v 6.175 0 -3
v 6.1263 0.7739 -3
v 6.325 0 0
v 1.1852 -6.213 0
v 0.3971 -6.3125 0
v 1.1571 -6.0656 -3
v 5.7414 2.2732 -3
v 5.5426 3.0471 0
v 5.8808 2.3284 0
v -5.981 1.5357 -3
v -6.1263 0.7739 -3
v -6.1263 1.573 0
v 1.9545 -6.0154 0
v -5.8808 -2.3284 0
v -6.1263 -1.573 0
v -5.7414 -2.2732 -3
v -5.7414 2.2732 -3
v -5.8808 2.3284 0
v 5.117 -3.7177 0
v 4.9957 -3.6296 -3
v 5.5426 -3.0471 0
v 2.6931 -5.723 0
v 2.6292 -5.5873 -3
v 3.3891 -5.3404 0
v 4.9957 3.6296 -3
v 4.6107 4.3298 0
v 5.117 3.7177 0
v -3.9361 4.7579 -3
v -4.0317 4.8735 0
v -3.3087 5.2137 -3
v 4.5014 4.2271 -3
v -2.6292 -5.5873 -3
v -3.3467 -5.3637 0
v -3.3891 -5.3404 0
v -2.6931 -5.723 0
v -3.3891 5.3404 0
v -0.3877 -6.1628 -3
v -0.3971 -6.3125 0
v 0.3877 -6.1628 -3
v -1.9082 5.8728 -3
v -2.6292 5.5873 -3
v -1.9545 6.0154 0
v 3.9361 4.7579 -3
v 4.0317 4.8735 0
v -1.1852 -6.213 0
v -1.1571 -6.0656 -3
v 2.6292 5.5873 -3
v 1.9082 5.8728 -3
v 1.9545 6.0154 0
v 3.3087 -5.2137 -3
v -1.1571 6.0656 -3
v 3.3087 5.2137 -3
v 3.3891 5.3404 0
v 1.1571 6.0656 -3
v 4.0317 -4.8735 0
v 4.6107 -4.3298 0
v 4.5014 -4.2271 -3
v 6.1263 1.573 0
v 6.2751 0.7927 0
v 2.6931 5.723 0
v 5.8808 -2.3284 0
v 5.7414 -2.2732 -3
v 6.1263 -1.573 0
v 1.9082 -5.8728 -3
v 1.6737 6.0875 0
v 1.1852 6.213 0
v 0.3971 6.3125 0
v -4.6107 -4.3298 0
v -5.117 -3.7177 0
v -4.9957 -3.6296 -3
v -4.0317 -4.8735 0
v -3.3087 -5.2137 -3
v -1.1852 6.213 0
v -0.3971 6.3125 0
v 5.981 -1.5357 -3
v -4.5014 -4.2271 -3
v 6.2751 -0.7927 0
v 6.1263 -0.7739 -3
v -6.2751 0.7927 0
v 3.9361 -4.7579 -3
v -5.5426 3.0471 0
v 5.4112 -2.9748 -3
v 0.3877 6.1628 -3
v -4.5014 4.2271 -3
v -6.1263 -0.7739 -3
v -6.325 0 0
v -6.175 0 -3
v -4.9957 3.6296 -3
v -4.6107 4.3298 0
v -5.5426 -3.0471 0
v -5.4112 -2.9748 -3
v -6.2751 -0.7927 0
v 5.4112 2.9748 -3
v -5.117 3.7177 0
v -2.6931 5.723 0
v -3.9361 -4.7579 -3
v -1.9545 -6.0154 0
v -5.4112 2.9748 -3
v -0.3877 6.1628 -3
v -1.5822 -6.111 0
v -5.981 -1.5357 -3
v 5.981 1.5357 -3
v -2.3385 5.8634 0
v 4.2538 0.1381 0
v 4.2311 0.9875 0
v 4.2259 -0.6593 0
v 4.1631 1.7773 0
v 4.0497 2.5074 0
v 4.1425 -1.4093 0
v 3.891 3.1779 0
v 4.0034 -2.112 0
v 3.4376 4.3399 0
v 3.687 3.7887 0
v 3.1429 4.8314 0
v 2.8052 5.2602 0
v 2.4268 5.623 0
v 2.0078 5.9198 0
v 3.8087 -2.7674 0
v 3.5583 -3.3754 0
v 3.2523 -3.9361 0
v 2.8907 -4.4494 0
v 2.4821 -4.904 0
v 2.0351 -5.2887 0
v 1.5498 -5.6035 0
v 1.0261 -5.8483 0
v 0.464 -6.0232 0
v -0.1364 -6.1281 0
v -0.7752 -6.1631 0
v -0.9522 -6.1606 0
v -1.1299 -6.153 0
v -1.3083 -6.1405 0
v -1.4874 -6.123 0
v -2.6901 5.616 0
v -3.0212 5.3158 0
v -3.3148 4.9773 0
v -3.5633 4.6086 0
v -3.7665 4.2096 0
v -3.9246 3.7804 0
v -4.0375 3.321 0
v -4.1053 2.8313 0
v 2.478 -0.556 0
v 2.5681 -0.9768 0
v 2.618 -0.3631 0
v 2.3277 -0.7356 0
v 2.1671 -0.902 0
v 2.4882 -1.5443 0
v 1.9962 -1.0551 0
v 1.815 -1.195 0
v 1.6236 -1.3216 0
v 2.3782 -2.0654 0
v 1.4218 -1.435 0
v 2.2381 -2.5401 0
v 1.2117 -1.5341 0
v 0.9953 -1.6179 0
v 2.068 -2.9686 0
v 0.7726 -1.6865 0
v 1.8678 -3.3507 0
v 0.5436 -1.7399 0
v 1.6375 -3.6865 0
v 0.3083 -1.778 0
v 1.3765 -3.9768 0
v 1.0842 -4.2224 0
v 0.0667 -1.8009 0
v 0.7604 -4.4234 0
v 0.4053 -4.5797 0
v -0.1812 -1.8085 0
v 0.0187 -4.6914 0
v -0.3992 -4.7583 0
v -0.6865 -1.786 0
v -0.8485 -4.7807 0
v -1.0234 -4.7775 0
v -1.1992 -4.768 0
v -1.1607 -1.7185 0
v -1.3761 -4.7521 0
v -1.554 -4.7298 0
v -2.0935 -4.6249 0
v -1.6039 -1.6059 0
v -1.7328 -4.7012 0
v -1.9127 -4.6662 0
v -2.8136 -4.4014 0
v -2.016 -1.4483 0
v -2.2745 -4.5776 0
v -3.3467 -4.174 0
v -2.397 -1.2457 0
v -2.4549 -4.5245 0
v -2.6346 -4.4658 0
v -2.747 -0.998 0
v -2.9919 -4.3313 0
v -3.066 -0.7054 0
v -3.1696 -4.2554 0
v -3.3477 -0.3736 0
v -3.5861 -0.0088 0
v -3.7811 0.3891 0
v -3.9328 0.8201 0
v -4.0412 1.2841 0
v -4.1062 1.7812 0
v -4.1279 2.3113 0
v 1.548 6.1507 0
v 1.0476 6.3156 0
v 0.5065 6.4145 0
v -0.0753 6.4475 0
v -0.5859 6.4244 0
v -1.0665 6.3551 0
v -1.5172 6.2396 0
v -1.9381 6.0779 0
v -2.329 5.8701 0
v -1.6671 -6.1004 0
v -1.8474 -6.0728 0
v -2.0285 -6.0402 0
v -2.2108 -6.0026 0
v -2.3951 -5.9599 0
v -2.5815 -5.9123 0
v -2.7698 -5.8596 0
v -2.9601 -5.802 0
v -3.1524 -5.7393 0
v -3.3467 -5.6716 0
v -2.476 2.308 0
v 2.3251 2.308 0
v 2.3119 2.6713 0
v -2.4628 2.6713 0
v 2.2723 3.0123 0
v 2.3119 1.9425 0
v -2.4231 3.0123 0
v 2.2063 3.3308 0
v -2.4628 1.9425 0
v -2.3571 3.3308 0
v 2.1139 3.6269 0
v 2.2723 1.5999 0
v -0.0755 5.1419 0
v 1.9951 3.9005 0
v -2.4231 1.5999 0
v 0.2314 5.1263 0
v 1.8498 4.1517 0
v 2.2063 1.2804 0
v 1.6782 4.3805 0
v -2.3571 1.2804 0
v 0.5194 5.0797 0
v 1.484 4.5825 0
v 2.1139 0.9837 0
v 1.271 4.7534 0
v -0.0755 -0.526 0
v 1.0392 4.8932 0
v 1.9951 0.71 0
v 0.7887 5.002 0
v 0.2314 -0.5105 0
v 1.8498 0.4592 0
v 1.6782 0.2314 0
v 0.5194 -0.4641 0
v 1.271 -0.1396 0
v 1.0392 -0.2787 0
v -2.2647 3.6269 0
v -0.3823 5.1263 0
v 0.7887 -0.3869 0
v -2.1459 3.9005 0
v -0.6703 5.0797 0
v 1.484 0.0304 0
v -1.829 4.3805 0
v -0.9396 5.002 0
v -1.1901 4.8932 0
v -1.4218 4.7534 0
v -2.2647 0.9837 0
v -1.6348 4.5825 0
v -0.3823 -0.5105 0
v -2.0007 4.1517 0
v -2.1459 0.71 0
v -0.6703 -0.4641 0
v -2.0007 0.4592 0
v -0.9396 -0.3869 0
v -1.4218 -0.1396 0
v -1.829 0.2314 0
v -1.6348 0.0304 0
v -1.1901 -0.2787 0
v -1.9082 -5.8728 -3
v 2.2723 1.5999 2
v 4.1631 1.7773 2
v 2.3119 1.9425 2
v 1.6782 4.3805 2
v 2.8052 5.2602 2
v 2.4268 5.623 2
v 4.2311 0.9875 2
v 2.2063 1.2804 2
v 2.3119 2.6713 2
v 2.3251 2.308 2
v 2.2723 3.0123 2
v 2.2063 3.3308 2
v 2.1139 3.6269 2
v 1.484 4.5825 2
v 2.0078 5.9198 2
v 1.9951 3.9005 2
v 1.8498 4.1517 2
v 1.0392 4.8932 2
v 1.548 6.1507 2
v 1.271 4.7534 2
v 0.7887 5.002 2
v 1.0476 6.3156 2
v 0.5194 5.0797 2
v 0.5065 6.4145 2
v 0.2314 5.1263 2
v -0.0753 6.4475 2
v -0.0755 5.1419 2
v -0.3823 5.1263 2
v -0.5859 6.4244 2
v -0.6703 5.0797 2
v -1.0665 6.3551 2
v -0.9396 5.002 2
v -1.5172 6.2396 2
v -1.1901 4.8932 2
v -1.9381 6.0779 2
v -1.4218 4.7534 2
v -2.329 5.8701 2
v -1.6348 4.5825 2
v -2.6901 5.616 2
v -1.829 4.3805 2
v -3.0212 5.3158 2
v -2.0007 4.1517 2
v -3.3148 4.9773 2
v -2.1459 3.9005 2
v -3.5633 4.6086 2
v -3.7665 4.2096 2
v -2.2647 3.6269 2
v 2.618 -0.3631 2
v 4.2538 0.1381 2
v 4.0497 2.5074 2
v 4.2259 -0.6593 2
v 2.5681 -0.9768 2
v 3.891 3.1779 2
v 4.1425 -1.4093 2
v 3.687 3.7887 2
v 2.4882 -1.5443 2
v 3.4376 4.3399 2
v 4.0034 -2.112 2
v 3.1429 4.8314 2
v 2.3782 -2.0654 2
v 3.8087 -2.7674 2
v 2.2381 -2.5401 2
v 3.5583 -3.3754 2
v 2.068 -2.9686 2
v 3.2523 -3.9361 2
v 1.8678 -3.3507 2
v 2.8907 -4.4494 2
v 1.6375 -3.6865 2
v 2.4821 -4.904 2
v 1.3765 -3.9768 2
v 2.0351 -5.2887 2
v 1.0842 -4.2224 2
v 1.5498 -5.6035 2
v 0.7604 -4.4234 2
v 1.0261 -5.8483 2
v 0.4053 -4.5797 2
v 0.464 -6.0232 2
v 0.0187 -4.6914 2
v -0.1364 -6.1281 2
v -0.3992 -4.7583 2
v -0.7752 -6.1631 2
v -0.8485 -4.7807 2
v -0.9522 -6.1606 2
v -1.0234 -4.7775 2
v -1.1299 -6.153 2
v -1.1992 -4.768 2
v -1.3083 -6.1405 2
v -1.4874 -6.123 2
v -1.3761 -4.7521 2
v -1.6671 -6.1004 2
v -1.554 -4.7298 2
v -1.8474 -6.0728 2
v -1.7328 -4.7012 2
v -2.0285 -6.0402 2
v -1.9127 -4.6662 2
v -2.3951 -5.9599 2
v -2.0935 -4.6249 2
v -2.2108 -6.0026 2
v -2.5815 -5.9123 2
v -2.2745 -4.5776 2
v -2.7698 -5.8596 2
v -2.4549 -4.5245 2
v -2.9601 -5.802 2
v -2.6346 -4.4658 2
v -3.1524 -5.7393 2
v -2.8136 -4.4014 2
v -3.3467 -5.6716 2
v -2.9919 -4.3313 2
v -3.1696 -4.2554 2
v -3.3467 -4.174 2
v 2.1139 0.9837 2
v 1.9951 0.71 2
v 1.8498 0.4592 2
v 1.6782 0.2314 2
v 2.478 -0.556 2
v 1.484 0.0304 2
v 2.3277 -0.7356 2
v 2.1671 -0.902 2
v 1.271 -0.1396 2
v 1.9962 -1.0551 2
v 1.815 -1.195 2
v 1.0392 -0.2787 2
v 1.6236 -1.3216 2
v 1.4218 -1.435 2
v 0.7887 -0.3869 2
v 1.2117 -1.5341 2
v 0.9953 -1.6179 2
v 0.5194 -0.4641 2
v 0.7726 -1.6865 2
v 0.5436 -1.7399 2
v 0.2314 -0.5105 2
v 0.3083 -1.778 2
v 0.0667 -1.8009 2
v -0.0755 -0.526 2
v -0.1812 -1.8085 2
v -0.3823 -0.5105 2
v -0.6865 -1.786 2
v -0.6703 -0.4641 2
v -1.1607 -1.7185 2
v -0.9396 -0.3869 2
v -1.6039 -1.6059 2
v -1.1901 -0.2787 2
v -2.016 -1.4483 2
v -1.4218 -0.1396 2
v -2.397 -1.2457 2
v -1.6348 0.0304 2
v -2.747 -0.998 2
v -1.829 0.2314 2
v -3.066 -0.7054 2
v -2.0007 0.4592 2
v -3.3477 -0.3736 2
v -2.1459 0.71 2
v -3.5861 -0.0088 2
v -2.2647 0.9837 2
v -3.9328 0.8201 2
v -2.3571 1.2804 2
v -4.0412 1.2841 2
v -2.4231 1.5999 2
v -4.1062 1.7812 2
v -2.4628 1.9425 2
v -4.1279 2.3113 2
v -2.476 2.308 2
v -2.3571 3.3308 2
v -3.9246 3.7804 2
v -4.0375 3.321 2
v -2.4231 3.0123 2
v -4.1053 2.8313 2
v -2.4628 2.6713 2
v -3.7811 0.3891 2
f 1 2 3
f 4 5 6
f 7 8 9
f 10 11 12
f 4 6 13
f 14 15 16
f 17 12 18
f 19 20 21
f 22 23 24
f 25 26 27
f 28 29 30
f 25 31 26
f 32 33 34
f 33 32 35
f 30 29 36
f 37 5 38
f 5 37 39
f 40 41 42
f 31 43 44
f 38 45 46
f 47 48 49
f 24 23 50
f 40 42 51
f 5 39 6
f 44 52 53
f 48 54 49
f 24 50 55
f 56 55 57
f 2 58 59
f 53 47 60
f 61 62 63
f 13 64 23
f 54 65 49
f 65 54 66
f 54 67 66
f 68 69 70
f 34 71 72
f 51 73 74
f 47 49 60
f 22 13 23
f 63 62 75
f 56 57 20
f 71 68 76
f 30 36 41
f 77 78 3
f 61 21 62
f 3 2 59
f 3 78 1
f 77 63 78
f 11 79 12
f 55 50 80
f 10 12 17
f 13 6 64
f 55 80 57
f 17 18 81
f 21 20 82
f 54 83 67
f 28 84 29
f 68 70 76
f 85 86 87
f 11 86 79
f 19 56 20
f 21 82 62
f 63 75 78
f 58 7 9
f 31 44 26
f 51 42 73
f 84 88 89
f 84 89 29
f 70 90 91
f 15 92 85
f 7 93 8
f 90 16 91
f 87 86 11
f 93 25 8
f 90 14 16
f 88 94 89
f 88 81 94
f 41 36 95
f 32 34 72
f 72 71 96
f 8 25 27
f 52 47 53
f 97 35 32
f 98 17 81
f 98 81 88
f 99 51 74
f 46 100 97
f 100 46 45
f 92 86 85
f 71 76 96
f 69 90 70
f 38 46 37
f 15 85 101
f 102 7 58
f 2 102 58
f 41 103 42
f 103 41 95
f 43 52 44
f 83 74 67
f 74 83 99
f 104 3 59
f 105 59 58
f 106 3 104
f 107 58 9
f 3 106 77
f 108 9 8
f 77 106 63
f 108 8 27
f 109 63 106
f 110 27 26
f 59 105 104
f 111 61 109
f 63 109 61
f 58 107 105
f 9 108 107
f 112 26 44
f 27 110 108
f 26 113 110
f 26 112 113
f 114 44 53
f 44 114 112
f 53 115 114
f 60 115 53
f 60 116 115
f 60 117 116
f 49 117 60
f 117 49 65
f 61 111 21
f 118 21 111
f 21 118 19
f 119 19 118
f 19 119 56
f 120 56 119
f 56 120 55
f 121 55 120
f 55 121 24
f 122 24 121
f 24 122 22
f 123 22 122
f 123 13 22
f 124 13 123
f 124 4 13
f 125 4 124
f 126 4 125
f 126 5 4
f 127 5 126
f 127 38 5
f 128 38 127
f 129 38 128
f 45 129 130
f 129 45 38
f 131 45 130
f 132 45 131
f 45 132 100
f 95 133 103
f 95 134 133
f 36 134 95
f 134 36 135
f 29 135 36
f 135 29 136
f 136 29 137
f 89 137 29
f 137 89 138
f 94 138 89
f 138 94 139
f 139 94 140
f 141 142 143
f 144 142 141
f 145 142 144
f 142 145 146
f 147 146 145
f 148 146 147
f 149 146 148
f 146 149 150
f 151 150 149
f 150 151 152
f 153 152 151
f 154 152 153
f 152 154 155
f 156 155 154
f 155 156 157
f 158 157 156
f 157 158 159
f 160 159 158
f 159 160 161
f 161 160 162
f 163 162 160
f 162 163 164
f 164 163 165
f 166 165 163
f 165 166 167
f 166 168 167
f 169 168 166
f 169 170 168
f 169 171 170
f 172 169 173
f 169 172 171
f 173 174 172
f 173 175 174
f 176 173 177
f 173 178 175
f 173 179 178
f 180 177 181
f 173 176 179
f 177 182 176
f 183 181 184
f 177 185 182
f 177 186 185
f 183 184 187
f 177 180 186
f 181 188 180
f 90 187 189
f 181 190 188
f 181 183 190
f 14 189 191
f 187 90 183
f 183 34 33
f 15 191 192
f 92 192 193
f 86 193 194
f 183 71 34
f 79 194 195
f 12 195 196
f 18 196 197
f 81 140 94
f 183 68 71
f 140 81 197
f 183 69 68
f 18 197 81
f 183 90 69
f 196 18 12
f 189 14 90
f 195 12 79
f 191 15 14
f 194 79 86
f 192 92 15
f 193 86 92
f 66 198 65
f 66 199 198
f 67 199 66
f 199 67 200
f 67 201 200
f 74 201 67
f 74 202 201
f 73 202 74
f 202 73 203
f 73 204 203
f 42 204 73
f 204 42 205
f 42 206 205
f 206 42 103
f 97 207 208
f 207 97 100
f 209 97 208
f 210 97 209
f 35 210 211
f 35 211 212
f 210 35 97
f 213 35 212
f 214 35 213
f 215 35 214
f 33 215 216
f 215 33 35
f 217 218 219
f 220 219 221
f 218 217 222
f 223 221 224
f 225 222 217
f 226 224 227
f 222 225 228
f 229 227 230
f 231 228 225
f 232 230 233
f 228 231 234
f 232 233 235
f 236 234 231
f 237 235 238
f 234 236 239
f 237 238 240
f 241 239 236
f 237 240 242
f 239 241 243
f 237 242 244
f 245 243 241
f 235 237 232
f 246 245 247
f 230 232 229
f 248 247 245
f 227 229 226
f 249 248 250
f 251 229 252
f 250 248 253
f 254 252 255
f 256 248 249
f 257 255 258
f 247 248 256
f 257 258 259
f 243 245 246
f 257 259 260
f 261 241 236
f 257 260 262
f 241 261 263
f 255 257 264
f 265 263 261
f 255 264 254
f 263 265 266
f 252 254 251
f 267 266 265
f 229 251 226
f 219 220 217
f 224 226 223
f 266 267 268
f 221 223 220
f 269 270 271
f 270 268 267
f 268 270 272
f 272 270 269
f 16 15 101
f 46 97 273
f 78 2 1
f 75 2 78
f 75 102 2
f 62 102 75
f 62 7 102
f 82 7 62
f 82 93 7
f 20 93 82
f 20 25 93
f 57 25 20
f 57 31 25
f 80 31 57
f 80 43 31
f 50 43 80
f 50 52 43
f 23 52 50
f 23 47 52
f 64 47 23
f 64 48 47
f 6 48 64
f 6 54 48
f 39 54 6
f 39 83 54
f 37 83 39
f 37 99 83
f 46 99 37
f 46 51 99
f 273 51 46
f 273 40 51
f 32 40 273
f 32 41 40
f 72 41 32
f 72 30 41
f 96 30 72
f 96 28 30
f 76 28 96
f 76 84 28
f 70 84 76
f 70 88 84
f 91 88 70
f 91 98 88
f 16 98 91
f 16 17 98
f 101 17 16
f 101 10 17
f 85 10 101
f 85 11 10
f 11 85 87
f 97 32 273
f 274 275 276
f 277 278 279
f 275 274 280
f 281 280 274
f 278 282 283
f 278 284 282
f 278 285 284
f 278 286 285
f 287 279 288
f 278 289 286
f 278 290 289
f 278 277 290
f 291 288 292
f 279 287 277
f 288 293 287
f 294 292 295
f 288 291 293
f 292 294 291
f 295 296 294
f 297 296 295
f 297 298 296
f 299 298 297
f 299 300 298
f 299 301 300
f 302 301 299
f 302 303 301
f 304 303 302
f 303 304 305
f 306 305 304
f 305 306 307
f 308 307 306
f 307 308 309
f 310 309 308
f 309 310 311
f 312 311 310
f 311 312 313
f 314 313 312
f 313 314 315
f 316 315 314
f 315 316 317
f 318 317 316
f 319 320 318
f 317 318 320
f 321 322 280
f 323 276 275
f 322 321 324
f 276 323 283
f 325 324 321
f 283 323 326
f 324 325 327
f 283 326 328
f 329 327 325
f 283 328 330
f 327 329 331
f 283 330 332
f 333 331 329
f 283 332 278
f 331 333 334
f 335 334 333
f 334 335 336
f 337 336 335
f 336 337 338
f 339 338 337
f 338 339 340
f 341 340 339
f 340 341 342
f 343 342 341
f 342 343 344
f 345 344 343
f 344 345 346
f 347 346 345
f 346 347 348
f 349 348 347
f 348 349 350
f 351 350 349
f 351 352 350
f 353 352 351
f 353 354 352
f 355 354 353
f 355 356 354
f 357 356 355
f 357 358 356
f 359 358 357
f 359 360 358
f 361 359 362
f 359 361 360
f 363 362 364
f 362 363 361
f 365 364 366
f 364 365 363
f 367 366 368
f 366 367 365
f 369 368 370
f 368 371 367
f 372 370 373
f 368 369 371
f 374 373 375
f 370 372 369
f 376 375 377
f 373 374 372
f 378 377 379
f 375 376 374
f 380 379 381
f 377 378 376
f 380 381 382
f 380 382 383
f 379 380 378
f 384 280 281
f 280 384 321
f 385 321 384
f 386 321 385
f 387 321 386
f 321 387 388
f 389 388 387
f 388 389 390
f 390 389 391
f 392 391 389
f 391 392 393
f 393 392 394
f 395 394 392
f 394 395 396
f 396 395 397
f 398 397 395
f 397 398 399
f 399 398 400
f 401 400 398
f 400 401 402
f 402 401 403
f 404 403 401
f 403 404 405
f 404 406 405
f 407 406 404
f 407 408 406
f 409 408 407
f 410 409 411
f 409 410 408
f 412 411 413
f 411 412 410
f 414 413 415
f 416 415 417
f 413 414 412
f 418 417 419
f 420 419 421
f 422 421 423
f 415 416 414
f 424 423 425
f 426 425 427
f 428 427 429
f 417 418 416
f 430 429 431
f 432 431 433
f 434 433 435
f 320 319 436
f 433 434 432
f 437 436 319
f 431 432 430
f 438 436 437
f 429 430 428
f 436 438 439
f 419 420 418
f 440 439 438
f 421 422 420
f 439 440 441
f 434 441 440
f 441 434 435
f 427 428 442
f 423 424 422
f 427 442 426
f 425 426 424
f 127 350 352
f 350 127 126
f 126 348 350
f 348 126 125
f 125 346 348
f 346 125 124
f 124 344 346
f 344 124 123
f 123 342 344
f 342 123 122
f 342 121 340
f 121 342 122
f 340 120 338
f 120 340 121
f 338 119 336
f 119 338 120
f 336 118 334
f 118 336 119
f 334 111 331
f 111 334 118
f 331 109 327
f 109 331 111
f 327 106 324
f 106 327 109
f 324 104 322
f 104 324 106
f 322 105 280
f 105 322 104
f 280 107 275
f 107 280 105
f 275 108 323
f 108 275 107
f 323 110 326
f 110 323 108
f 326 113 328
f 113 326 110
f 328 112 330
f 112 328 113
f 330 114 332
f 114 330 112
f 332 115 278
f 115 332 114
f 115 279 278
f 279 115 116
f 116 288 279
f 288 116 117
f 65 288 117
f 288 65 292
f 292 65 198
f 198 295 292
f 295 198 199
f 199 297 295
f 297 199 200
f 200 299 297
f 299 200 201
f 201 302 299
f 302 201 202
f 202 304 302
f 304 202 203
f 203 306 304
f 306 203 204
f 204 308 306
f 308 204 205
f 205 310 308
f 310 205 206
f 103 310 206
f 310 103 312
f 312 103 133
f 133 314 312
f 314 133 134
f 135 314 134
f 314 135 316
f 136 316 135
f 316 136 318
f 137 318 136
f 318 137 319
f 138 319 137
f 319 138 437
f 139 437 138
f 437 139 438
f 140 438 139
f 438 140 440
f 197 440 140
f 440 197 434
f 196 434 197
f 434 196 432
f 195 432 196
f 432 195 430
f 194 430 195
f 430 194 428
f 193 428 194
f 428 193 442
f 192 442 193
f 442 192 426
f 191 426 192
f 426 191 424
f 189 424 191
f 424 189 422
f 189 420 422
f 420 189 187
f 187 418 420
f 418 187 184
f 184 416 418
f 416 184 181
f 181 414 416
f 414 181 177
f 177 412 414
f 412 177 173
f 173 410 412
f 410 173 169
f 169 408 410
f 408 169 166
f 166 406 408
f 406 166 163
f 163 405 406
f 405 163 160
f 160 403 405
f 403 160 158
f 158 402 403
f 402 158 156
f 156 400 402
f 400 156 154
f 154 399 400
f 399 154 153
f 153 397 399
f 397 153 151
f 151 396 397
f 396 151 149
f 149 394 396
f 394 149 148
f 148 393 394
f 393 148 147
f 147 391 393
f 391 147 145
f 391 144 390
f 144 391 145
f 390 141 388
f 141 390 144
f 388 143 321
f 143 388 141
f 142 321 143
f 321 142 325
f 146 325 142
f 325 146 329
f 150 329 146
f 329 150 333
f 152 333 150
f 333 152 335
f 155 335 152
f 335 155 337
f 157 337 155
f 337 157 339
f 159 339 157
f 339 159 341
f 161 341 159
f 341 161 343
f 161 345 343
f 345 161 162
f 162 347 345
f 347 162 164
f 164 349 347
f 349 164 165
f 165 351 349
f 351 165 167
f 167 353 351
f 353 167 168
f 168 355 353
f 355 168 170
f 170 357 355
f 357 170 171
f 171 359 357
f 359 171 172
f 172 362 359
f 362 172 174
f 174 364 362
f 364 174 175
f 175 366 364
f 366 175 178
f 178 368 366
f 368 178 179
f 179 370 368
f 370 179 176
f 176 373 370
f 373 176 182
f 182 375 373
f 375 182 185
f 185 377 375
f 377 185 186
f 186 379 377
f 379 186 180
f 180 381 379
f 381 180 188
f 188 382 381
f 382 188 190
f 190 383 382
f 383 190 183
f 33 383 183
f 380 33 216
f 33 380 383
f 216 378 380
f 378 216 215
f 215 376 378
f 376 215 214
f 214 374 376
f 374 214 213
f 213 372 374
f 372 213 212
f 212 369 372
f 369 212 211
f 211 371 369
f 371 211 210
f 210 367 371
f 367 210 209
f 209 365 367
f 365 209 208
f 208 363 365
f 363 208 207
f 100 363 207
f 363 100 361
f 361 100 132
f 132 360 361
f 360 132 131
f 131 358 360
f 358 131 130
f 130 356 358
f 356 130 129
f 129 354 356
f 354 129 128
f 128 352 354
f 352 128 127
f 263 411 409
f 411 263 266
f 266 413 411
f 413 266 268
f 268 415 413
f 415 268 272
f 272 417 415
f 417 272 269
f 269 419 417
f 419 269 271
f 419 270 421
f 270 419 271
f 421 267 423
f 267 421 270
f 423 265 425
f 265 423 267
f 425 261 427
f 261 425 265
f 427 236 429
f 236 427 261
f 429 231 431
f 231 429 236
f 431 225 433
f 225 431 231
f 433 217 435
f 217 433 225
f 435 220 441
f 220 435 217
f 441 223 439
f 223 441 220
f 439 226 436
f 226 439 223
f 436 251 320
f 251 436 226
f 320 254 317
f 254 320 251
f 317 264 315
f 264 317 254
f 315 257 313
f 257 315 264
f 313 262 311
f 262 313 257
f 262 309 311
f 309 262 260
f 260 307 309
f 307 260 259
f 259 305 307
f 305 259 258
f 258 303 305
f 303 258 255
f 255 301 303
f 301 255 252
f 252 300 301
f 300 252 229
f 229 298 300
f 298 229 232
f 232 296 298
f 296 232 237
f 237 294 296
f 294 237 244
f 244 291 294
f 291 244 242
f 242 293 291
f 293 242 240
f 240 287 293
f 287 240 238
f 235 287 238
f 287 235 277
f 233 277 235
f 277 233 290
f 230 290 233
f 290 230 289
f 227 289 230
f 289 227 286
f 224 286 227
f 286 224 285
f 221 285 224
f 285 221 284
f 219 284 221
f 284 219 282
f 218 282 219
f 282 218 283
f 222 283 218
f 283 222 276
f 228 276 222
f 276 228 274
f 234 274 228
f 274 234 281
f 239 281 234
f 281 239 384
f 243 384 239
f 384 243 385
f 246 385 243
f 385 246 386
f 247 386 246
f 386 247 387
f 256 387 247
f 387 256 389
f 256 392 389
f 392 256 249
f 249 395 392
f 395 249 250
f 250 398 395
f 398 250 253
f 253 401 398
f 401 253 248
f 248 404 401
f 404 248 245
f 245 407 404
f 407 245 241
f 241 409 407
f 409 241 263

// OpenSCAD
$fn = 50;


difference() {
	union() {
		translate(v = [0, 0, -3.0000000000]) {
			cylinder(h = 3, r1 = 6.1750000000, r2 = 6.3250000000);
		}
		linear_extrude(height = 2) {
			text(font = "Impact", halign = "center", size = 12, text = "9", valign = "center");
		}
	}
	union();
}
